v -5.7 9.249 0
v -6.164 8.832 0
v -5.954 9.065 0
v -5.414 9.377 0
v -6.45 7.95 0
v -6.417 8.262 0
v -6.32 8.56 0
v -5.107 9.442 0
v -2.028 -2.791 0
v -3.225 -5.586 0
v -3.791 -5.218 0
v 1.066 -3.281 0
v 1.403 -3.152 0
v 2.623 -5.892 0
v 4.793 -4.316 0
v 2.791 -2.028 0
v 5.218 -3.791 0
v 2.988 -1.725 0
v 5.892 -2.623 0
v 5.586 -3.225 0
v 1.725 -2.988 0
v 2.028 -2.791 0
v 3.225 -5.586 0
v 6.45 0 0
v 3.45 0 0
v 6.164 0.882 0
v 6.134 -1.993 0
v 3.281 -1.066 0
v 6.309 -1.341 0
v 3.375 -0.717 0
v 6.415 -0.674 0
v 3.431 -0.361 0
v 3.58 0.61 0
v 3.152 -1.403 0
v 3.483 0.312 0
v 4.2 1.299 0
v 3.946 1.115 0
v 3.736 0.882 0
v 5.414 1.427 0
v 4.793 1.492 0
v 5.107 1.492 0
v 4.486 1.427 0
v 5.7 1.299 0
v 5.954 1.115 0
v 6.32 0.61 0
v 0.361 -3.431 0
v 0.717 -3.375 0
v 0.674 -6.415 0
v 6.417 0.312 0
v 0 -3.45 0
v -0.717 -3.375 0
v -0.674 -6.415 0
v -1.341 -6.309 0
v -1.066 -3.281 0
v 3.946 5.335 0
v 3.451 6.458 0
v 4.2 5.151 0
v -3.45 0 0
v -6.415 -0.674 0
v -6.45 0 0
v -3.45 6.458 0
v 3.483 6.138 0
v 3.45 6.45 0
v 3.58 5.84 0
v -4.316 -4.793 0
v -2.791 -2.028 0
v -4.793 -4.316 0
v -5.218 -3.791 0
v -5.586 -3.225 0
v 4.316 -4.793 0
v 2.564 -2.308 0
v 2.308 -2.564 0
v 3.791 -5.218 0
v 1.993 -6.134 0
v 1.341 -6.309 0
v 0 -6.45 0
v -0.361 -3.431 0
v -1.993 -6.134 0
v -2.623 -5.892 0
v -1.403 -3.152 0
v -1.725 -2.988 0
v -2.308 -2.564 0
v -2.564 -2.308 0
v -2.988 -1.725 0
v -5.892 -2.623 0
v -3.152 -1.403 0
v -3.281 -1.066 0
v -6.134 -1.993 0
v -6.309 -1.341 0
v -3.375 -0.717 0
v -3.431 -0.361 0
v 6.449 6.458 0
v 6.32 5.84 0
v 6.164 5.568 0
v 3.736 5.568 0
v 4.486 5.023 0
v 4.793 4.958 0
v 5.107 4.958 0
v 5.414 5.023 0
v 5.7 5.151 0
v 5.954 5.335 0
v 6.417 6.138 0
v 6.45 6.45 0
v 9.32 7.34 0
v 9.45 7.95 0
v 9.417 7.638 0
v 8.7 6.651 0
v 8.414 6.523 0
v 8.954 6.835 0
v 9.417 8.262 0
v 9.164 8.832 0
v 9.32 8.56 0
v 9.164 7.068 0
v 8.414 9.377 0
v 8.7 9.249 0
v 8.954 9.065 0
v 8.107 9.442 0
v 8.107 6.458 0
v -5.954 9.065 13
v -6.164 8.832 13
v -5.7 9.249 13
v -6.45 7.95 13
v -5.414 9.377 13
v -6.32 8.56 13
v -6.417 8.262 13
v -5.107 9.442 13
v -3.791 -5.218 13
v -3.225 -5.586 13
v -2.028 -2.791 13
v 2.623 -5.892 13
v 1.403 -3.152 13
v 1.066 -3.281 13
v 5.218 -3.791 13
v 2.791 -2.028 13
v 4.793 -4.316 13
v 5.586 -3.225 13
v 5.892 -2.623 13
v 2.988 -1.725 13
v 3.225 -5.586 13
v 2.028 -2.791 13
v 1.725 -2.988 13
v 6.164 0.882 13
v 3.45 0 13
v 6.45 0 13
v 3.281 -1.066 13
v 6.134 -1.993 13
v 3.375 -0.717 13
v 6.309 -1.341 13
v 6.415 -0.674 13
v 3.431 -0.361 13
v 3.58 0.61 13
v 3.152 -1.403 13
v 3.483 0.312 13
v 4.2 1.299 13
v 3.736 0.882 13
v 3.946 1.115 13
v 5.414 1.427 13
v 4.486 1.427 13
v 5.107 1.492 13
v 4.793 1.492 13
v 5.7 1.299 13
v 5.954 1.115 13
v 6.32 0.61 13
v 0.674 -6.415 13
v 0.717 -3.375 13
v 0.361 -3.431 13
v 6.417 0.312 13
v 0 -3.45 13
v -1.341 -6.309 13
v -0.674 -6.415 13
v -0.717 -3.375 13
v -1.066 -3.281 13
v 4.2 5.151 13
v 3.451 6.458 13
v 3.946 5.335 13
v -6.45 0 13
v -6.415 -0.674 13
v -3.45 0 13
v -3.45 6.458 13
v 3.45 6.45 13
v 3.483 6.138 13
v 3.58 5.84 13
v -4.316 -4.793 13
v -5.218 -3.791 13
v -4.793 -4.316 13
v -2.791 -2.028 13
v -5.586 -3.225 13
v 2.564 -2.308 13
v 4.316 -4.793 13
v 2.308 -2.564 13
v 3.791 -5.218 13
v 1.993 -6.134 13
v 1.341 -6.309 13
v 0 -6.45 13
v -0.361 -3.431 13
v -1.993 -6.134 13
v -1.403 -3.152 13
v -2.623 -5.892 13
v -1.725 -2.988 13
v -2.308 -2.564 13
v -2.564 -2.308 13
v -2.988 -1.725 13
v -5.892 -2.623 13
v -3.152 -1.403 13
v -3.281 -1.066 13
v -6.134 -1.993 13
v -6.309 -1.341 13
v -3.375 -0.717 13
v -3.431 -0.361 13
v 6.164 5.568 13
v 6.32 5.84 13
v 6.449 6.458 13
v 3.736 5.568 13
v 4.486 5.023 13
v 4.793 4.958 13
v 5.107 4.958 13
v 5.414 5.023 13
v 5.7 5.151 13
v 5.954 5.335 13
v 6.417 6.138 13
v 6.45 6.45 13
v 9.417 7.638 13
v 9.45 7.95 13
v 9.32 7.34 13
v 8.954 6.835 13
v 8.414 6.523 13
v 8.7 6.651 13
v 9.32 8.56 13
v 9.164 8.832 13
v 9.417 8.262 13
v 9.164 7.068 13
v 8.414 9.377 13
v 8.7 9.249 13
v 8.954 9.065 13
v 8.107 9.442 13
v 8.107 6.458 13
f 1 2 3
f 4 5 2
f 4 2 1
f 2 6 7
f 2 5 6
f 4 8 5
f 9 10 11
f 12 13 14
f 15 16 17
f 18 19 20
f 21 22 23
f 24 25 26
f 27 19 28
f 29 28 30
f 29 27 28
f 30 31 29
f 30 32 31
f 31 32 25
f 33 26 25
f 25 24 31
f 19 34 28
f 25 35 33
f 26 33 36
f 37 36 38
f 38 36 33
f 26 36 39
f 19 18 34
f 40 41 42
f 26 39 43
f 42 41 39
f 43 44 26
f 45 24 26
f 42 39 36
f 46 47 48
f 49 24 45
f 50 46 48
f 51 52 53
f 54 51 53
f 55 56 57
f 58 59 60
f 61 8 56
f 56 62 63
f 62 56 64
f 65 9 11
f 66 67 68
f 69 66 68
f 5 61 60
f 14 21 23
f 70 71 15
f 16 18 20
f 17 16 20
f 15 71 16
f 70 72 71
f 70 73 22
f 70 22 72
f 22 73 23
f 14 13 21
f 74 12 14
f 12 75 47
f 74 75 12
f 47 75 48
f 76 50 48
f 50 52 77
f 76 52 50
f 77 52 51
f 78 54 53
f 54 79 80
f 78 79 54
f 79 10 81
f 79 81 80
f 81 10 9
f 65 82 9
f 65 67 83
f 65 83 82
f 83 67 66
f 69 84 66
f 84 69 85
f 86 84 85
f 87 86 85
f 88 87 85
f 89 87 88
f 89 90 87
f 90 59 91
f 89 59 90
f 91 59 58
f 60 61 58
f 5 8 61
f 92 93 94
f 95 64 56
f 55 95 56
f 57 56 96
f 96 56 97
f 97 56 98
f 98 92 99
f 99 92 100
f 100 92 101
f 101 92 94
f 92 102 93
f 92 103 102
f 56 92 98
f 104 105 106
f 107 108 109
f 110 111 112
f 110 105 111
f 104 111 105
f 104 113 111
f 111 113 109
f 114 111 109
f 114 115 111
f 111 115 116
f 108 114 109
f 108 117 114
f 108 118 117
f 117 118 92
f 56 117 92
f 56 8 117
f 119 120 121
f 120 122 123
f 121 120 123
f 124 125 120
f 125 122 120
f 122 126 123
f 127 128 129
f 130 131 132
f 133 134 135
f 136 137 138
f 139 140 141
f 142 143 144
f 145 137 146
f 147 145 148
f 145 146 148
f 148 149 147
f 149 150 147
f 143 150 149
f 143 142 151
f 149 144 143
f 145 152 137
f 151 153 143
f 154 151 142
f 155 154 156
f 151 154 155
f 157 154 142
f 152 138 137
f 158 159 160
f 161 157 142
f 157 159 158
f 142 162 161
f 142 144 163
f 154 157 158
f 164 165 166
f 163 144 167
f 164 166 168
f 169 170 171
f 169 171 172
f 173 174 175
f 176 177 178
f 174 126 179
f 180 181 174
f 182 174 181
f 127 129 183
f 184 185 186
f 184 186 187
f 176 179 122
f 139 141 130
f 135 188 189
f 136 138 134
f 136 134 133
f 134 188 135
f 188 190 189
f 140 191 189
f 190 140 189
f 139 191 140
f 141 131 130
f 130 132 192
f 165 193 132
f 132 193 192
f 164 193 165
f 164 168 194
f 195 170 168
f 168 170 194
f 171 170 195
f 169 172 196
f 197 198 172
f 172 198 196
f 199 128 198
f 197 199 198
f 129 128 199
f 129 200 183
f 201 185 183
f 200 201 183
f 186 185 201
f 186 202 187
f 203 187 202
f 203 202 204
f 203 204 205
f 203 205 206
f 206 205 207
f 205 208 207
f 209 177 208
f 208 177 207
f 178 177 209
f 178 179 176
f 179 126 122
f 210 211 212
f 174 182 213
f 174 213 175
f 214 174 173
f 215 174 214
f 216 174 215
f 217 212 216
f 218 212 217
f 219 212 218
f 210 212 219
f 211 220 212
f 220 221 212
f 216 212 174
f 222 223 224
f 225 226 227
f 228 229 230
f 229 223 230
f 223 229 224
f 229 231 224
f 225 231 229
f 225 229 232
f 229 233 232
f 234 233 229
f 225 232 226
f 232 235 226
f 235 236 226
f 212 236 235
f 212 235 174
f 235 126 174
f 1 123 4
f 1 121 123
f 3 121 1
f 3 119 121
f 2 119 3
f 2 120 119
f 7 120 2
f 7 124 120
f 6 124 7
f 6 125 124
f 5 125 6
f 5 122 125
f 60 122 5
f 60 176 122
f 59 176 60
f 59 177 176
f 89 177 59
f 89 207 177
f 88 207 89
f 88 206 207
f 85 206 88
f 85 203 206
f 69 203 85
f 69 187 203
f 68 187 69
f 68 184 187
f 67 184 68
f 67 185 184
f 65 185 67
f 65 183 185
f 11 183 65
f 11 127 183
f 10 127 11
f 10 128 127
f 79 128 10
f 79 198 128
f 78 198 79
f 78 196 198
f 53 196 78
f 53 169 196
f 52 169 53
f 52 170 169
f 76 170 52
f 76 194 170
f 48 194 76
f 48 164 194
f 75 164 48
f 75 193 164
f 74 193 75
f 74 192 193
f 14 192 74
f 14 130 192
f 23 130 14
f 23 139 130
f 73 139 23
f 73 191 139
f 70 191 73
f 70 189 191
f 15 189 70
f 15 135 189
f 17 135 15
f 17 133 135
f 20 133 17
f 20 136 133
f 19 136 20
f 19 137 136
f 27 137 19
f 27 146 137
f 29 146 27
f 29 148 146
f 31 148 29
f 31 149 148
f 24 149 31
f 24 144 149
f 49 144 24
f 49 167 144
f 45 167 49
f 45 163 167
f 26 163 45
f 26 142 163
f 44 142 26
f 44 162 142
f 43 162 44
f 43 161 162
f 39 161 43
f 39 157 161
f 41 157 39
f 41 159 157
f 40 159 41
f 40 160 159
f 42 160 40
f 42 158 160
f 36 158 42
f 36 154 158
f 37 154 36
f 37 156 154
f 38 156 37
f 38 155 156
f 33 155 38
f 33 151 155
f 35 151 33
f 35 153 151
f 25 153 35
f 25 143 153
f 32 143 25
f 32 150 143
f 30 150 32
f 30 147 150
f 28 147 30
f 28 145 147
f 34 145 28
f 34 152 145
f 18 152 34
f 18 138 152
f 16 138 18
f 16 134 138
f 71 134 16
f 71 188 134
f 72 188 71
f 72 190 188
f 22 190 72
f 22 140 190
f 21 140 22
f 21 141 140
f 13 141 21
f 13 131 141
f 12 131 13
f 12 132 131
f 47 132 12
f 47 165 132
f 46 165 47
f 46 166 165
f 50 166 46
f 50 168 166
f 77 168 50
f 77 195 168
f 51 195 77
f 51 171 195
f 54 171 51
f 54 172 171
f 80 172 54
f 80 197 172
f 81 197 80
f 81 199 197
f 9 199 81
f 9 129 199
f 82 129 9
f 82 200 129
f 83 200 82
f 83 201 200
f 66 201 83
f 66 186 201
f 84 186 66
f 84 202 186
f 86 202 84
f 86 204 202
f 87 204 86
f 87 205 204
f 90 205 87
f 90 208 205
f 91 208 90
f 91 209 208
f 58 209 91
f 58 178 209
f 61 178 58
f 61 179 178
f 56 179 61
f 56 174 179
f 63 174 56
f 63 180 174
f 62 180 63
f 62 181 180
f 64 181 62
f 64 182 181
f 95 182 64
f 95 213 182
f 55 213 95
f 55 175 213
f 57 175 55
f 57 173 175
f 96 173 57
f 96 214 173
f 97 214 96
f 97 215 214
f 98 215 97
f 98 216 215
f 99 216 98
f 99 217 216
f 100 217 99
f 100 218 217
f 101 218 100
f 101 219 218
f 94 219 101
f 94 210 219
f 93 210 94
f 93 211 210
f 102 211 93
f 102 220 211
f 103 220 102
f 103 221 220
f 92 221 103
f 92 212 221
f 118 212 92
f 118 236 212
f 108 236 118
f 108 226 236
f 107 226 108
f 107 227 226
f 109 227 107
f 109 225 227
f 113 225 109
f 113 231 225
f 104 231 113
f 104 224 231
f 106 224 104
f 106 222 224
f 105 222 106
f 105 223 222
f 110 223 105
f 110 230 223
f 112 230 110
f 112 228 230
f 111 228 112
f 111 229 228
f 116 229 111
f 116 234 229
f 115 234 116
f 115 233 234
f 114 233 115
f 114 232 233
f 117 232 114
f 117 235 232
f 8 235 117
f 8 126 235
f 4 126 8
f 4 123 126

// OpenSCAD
// Clips to hold oxygen tubing along a ceiling or wall.
// Sized to be attached with small double-sided tape that is
// 1/2" x 5/8" (12.5 mm, 13.7 mm).  3M sells packs of small
// hooks for holiday lights.  Those packs include Command™
// tapes that fit the bill.
//
// Adrian McCarthy 2024-06-09

nozzle_d = 0.4;
id = 6.5 + nozzle_d;
th = 3;

od = id + 2*th;

r = (id+od)/2/2;
x0 = 0 - r;
x1 = 0 + r;
y0 = 0 - r;
y1 = 0 + r;

profile = [
    [x1+th, y1+th, th],
    [x0, y1+th, th],
    [x0, 0, th]
];

linear_extrude(13) {
    hull() {
        translate([profile[0].x, profile[0].y]) circle(d=profile[0].z, $fs=nozzle_d/2);
        translate([profile[1].x, profile[1].y]) circle(d=profile[1].z, $fs=nozzle_d/2);
    }
    hull() {
        translate([profile[1].x, profile[1].y]) circle(d=profile[1].z, $fs=nozzle_d/2);
        translate([profile[2].x, profile[2].y]) circle(d=profile[2].z, $fs=nozzle_d/2);
    }
    #translate([r, y1+th/2]) circle(d=th, $fs=nozzle_d/2);
    for (theta=[186:6:360]) {
        hull() {
            rotate([0, 0, theta])   translate([r, 0]) circle(d=th, $fs=nozzle_d/2);
            rotate([0, 0, theta-6]) translate([r, 0]) circle(d=th, $fs=nozzle_d/2);
        }
    }
}
